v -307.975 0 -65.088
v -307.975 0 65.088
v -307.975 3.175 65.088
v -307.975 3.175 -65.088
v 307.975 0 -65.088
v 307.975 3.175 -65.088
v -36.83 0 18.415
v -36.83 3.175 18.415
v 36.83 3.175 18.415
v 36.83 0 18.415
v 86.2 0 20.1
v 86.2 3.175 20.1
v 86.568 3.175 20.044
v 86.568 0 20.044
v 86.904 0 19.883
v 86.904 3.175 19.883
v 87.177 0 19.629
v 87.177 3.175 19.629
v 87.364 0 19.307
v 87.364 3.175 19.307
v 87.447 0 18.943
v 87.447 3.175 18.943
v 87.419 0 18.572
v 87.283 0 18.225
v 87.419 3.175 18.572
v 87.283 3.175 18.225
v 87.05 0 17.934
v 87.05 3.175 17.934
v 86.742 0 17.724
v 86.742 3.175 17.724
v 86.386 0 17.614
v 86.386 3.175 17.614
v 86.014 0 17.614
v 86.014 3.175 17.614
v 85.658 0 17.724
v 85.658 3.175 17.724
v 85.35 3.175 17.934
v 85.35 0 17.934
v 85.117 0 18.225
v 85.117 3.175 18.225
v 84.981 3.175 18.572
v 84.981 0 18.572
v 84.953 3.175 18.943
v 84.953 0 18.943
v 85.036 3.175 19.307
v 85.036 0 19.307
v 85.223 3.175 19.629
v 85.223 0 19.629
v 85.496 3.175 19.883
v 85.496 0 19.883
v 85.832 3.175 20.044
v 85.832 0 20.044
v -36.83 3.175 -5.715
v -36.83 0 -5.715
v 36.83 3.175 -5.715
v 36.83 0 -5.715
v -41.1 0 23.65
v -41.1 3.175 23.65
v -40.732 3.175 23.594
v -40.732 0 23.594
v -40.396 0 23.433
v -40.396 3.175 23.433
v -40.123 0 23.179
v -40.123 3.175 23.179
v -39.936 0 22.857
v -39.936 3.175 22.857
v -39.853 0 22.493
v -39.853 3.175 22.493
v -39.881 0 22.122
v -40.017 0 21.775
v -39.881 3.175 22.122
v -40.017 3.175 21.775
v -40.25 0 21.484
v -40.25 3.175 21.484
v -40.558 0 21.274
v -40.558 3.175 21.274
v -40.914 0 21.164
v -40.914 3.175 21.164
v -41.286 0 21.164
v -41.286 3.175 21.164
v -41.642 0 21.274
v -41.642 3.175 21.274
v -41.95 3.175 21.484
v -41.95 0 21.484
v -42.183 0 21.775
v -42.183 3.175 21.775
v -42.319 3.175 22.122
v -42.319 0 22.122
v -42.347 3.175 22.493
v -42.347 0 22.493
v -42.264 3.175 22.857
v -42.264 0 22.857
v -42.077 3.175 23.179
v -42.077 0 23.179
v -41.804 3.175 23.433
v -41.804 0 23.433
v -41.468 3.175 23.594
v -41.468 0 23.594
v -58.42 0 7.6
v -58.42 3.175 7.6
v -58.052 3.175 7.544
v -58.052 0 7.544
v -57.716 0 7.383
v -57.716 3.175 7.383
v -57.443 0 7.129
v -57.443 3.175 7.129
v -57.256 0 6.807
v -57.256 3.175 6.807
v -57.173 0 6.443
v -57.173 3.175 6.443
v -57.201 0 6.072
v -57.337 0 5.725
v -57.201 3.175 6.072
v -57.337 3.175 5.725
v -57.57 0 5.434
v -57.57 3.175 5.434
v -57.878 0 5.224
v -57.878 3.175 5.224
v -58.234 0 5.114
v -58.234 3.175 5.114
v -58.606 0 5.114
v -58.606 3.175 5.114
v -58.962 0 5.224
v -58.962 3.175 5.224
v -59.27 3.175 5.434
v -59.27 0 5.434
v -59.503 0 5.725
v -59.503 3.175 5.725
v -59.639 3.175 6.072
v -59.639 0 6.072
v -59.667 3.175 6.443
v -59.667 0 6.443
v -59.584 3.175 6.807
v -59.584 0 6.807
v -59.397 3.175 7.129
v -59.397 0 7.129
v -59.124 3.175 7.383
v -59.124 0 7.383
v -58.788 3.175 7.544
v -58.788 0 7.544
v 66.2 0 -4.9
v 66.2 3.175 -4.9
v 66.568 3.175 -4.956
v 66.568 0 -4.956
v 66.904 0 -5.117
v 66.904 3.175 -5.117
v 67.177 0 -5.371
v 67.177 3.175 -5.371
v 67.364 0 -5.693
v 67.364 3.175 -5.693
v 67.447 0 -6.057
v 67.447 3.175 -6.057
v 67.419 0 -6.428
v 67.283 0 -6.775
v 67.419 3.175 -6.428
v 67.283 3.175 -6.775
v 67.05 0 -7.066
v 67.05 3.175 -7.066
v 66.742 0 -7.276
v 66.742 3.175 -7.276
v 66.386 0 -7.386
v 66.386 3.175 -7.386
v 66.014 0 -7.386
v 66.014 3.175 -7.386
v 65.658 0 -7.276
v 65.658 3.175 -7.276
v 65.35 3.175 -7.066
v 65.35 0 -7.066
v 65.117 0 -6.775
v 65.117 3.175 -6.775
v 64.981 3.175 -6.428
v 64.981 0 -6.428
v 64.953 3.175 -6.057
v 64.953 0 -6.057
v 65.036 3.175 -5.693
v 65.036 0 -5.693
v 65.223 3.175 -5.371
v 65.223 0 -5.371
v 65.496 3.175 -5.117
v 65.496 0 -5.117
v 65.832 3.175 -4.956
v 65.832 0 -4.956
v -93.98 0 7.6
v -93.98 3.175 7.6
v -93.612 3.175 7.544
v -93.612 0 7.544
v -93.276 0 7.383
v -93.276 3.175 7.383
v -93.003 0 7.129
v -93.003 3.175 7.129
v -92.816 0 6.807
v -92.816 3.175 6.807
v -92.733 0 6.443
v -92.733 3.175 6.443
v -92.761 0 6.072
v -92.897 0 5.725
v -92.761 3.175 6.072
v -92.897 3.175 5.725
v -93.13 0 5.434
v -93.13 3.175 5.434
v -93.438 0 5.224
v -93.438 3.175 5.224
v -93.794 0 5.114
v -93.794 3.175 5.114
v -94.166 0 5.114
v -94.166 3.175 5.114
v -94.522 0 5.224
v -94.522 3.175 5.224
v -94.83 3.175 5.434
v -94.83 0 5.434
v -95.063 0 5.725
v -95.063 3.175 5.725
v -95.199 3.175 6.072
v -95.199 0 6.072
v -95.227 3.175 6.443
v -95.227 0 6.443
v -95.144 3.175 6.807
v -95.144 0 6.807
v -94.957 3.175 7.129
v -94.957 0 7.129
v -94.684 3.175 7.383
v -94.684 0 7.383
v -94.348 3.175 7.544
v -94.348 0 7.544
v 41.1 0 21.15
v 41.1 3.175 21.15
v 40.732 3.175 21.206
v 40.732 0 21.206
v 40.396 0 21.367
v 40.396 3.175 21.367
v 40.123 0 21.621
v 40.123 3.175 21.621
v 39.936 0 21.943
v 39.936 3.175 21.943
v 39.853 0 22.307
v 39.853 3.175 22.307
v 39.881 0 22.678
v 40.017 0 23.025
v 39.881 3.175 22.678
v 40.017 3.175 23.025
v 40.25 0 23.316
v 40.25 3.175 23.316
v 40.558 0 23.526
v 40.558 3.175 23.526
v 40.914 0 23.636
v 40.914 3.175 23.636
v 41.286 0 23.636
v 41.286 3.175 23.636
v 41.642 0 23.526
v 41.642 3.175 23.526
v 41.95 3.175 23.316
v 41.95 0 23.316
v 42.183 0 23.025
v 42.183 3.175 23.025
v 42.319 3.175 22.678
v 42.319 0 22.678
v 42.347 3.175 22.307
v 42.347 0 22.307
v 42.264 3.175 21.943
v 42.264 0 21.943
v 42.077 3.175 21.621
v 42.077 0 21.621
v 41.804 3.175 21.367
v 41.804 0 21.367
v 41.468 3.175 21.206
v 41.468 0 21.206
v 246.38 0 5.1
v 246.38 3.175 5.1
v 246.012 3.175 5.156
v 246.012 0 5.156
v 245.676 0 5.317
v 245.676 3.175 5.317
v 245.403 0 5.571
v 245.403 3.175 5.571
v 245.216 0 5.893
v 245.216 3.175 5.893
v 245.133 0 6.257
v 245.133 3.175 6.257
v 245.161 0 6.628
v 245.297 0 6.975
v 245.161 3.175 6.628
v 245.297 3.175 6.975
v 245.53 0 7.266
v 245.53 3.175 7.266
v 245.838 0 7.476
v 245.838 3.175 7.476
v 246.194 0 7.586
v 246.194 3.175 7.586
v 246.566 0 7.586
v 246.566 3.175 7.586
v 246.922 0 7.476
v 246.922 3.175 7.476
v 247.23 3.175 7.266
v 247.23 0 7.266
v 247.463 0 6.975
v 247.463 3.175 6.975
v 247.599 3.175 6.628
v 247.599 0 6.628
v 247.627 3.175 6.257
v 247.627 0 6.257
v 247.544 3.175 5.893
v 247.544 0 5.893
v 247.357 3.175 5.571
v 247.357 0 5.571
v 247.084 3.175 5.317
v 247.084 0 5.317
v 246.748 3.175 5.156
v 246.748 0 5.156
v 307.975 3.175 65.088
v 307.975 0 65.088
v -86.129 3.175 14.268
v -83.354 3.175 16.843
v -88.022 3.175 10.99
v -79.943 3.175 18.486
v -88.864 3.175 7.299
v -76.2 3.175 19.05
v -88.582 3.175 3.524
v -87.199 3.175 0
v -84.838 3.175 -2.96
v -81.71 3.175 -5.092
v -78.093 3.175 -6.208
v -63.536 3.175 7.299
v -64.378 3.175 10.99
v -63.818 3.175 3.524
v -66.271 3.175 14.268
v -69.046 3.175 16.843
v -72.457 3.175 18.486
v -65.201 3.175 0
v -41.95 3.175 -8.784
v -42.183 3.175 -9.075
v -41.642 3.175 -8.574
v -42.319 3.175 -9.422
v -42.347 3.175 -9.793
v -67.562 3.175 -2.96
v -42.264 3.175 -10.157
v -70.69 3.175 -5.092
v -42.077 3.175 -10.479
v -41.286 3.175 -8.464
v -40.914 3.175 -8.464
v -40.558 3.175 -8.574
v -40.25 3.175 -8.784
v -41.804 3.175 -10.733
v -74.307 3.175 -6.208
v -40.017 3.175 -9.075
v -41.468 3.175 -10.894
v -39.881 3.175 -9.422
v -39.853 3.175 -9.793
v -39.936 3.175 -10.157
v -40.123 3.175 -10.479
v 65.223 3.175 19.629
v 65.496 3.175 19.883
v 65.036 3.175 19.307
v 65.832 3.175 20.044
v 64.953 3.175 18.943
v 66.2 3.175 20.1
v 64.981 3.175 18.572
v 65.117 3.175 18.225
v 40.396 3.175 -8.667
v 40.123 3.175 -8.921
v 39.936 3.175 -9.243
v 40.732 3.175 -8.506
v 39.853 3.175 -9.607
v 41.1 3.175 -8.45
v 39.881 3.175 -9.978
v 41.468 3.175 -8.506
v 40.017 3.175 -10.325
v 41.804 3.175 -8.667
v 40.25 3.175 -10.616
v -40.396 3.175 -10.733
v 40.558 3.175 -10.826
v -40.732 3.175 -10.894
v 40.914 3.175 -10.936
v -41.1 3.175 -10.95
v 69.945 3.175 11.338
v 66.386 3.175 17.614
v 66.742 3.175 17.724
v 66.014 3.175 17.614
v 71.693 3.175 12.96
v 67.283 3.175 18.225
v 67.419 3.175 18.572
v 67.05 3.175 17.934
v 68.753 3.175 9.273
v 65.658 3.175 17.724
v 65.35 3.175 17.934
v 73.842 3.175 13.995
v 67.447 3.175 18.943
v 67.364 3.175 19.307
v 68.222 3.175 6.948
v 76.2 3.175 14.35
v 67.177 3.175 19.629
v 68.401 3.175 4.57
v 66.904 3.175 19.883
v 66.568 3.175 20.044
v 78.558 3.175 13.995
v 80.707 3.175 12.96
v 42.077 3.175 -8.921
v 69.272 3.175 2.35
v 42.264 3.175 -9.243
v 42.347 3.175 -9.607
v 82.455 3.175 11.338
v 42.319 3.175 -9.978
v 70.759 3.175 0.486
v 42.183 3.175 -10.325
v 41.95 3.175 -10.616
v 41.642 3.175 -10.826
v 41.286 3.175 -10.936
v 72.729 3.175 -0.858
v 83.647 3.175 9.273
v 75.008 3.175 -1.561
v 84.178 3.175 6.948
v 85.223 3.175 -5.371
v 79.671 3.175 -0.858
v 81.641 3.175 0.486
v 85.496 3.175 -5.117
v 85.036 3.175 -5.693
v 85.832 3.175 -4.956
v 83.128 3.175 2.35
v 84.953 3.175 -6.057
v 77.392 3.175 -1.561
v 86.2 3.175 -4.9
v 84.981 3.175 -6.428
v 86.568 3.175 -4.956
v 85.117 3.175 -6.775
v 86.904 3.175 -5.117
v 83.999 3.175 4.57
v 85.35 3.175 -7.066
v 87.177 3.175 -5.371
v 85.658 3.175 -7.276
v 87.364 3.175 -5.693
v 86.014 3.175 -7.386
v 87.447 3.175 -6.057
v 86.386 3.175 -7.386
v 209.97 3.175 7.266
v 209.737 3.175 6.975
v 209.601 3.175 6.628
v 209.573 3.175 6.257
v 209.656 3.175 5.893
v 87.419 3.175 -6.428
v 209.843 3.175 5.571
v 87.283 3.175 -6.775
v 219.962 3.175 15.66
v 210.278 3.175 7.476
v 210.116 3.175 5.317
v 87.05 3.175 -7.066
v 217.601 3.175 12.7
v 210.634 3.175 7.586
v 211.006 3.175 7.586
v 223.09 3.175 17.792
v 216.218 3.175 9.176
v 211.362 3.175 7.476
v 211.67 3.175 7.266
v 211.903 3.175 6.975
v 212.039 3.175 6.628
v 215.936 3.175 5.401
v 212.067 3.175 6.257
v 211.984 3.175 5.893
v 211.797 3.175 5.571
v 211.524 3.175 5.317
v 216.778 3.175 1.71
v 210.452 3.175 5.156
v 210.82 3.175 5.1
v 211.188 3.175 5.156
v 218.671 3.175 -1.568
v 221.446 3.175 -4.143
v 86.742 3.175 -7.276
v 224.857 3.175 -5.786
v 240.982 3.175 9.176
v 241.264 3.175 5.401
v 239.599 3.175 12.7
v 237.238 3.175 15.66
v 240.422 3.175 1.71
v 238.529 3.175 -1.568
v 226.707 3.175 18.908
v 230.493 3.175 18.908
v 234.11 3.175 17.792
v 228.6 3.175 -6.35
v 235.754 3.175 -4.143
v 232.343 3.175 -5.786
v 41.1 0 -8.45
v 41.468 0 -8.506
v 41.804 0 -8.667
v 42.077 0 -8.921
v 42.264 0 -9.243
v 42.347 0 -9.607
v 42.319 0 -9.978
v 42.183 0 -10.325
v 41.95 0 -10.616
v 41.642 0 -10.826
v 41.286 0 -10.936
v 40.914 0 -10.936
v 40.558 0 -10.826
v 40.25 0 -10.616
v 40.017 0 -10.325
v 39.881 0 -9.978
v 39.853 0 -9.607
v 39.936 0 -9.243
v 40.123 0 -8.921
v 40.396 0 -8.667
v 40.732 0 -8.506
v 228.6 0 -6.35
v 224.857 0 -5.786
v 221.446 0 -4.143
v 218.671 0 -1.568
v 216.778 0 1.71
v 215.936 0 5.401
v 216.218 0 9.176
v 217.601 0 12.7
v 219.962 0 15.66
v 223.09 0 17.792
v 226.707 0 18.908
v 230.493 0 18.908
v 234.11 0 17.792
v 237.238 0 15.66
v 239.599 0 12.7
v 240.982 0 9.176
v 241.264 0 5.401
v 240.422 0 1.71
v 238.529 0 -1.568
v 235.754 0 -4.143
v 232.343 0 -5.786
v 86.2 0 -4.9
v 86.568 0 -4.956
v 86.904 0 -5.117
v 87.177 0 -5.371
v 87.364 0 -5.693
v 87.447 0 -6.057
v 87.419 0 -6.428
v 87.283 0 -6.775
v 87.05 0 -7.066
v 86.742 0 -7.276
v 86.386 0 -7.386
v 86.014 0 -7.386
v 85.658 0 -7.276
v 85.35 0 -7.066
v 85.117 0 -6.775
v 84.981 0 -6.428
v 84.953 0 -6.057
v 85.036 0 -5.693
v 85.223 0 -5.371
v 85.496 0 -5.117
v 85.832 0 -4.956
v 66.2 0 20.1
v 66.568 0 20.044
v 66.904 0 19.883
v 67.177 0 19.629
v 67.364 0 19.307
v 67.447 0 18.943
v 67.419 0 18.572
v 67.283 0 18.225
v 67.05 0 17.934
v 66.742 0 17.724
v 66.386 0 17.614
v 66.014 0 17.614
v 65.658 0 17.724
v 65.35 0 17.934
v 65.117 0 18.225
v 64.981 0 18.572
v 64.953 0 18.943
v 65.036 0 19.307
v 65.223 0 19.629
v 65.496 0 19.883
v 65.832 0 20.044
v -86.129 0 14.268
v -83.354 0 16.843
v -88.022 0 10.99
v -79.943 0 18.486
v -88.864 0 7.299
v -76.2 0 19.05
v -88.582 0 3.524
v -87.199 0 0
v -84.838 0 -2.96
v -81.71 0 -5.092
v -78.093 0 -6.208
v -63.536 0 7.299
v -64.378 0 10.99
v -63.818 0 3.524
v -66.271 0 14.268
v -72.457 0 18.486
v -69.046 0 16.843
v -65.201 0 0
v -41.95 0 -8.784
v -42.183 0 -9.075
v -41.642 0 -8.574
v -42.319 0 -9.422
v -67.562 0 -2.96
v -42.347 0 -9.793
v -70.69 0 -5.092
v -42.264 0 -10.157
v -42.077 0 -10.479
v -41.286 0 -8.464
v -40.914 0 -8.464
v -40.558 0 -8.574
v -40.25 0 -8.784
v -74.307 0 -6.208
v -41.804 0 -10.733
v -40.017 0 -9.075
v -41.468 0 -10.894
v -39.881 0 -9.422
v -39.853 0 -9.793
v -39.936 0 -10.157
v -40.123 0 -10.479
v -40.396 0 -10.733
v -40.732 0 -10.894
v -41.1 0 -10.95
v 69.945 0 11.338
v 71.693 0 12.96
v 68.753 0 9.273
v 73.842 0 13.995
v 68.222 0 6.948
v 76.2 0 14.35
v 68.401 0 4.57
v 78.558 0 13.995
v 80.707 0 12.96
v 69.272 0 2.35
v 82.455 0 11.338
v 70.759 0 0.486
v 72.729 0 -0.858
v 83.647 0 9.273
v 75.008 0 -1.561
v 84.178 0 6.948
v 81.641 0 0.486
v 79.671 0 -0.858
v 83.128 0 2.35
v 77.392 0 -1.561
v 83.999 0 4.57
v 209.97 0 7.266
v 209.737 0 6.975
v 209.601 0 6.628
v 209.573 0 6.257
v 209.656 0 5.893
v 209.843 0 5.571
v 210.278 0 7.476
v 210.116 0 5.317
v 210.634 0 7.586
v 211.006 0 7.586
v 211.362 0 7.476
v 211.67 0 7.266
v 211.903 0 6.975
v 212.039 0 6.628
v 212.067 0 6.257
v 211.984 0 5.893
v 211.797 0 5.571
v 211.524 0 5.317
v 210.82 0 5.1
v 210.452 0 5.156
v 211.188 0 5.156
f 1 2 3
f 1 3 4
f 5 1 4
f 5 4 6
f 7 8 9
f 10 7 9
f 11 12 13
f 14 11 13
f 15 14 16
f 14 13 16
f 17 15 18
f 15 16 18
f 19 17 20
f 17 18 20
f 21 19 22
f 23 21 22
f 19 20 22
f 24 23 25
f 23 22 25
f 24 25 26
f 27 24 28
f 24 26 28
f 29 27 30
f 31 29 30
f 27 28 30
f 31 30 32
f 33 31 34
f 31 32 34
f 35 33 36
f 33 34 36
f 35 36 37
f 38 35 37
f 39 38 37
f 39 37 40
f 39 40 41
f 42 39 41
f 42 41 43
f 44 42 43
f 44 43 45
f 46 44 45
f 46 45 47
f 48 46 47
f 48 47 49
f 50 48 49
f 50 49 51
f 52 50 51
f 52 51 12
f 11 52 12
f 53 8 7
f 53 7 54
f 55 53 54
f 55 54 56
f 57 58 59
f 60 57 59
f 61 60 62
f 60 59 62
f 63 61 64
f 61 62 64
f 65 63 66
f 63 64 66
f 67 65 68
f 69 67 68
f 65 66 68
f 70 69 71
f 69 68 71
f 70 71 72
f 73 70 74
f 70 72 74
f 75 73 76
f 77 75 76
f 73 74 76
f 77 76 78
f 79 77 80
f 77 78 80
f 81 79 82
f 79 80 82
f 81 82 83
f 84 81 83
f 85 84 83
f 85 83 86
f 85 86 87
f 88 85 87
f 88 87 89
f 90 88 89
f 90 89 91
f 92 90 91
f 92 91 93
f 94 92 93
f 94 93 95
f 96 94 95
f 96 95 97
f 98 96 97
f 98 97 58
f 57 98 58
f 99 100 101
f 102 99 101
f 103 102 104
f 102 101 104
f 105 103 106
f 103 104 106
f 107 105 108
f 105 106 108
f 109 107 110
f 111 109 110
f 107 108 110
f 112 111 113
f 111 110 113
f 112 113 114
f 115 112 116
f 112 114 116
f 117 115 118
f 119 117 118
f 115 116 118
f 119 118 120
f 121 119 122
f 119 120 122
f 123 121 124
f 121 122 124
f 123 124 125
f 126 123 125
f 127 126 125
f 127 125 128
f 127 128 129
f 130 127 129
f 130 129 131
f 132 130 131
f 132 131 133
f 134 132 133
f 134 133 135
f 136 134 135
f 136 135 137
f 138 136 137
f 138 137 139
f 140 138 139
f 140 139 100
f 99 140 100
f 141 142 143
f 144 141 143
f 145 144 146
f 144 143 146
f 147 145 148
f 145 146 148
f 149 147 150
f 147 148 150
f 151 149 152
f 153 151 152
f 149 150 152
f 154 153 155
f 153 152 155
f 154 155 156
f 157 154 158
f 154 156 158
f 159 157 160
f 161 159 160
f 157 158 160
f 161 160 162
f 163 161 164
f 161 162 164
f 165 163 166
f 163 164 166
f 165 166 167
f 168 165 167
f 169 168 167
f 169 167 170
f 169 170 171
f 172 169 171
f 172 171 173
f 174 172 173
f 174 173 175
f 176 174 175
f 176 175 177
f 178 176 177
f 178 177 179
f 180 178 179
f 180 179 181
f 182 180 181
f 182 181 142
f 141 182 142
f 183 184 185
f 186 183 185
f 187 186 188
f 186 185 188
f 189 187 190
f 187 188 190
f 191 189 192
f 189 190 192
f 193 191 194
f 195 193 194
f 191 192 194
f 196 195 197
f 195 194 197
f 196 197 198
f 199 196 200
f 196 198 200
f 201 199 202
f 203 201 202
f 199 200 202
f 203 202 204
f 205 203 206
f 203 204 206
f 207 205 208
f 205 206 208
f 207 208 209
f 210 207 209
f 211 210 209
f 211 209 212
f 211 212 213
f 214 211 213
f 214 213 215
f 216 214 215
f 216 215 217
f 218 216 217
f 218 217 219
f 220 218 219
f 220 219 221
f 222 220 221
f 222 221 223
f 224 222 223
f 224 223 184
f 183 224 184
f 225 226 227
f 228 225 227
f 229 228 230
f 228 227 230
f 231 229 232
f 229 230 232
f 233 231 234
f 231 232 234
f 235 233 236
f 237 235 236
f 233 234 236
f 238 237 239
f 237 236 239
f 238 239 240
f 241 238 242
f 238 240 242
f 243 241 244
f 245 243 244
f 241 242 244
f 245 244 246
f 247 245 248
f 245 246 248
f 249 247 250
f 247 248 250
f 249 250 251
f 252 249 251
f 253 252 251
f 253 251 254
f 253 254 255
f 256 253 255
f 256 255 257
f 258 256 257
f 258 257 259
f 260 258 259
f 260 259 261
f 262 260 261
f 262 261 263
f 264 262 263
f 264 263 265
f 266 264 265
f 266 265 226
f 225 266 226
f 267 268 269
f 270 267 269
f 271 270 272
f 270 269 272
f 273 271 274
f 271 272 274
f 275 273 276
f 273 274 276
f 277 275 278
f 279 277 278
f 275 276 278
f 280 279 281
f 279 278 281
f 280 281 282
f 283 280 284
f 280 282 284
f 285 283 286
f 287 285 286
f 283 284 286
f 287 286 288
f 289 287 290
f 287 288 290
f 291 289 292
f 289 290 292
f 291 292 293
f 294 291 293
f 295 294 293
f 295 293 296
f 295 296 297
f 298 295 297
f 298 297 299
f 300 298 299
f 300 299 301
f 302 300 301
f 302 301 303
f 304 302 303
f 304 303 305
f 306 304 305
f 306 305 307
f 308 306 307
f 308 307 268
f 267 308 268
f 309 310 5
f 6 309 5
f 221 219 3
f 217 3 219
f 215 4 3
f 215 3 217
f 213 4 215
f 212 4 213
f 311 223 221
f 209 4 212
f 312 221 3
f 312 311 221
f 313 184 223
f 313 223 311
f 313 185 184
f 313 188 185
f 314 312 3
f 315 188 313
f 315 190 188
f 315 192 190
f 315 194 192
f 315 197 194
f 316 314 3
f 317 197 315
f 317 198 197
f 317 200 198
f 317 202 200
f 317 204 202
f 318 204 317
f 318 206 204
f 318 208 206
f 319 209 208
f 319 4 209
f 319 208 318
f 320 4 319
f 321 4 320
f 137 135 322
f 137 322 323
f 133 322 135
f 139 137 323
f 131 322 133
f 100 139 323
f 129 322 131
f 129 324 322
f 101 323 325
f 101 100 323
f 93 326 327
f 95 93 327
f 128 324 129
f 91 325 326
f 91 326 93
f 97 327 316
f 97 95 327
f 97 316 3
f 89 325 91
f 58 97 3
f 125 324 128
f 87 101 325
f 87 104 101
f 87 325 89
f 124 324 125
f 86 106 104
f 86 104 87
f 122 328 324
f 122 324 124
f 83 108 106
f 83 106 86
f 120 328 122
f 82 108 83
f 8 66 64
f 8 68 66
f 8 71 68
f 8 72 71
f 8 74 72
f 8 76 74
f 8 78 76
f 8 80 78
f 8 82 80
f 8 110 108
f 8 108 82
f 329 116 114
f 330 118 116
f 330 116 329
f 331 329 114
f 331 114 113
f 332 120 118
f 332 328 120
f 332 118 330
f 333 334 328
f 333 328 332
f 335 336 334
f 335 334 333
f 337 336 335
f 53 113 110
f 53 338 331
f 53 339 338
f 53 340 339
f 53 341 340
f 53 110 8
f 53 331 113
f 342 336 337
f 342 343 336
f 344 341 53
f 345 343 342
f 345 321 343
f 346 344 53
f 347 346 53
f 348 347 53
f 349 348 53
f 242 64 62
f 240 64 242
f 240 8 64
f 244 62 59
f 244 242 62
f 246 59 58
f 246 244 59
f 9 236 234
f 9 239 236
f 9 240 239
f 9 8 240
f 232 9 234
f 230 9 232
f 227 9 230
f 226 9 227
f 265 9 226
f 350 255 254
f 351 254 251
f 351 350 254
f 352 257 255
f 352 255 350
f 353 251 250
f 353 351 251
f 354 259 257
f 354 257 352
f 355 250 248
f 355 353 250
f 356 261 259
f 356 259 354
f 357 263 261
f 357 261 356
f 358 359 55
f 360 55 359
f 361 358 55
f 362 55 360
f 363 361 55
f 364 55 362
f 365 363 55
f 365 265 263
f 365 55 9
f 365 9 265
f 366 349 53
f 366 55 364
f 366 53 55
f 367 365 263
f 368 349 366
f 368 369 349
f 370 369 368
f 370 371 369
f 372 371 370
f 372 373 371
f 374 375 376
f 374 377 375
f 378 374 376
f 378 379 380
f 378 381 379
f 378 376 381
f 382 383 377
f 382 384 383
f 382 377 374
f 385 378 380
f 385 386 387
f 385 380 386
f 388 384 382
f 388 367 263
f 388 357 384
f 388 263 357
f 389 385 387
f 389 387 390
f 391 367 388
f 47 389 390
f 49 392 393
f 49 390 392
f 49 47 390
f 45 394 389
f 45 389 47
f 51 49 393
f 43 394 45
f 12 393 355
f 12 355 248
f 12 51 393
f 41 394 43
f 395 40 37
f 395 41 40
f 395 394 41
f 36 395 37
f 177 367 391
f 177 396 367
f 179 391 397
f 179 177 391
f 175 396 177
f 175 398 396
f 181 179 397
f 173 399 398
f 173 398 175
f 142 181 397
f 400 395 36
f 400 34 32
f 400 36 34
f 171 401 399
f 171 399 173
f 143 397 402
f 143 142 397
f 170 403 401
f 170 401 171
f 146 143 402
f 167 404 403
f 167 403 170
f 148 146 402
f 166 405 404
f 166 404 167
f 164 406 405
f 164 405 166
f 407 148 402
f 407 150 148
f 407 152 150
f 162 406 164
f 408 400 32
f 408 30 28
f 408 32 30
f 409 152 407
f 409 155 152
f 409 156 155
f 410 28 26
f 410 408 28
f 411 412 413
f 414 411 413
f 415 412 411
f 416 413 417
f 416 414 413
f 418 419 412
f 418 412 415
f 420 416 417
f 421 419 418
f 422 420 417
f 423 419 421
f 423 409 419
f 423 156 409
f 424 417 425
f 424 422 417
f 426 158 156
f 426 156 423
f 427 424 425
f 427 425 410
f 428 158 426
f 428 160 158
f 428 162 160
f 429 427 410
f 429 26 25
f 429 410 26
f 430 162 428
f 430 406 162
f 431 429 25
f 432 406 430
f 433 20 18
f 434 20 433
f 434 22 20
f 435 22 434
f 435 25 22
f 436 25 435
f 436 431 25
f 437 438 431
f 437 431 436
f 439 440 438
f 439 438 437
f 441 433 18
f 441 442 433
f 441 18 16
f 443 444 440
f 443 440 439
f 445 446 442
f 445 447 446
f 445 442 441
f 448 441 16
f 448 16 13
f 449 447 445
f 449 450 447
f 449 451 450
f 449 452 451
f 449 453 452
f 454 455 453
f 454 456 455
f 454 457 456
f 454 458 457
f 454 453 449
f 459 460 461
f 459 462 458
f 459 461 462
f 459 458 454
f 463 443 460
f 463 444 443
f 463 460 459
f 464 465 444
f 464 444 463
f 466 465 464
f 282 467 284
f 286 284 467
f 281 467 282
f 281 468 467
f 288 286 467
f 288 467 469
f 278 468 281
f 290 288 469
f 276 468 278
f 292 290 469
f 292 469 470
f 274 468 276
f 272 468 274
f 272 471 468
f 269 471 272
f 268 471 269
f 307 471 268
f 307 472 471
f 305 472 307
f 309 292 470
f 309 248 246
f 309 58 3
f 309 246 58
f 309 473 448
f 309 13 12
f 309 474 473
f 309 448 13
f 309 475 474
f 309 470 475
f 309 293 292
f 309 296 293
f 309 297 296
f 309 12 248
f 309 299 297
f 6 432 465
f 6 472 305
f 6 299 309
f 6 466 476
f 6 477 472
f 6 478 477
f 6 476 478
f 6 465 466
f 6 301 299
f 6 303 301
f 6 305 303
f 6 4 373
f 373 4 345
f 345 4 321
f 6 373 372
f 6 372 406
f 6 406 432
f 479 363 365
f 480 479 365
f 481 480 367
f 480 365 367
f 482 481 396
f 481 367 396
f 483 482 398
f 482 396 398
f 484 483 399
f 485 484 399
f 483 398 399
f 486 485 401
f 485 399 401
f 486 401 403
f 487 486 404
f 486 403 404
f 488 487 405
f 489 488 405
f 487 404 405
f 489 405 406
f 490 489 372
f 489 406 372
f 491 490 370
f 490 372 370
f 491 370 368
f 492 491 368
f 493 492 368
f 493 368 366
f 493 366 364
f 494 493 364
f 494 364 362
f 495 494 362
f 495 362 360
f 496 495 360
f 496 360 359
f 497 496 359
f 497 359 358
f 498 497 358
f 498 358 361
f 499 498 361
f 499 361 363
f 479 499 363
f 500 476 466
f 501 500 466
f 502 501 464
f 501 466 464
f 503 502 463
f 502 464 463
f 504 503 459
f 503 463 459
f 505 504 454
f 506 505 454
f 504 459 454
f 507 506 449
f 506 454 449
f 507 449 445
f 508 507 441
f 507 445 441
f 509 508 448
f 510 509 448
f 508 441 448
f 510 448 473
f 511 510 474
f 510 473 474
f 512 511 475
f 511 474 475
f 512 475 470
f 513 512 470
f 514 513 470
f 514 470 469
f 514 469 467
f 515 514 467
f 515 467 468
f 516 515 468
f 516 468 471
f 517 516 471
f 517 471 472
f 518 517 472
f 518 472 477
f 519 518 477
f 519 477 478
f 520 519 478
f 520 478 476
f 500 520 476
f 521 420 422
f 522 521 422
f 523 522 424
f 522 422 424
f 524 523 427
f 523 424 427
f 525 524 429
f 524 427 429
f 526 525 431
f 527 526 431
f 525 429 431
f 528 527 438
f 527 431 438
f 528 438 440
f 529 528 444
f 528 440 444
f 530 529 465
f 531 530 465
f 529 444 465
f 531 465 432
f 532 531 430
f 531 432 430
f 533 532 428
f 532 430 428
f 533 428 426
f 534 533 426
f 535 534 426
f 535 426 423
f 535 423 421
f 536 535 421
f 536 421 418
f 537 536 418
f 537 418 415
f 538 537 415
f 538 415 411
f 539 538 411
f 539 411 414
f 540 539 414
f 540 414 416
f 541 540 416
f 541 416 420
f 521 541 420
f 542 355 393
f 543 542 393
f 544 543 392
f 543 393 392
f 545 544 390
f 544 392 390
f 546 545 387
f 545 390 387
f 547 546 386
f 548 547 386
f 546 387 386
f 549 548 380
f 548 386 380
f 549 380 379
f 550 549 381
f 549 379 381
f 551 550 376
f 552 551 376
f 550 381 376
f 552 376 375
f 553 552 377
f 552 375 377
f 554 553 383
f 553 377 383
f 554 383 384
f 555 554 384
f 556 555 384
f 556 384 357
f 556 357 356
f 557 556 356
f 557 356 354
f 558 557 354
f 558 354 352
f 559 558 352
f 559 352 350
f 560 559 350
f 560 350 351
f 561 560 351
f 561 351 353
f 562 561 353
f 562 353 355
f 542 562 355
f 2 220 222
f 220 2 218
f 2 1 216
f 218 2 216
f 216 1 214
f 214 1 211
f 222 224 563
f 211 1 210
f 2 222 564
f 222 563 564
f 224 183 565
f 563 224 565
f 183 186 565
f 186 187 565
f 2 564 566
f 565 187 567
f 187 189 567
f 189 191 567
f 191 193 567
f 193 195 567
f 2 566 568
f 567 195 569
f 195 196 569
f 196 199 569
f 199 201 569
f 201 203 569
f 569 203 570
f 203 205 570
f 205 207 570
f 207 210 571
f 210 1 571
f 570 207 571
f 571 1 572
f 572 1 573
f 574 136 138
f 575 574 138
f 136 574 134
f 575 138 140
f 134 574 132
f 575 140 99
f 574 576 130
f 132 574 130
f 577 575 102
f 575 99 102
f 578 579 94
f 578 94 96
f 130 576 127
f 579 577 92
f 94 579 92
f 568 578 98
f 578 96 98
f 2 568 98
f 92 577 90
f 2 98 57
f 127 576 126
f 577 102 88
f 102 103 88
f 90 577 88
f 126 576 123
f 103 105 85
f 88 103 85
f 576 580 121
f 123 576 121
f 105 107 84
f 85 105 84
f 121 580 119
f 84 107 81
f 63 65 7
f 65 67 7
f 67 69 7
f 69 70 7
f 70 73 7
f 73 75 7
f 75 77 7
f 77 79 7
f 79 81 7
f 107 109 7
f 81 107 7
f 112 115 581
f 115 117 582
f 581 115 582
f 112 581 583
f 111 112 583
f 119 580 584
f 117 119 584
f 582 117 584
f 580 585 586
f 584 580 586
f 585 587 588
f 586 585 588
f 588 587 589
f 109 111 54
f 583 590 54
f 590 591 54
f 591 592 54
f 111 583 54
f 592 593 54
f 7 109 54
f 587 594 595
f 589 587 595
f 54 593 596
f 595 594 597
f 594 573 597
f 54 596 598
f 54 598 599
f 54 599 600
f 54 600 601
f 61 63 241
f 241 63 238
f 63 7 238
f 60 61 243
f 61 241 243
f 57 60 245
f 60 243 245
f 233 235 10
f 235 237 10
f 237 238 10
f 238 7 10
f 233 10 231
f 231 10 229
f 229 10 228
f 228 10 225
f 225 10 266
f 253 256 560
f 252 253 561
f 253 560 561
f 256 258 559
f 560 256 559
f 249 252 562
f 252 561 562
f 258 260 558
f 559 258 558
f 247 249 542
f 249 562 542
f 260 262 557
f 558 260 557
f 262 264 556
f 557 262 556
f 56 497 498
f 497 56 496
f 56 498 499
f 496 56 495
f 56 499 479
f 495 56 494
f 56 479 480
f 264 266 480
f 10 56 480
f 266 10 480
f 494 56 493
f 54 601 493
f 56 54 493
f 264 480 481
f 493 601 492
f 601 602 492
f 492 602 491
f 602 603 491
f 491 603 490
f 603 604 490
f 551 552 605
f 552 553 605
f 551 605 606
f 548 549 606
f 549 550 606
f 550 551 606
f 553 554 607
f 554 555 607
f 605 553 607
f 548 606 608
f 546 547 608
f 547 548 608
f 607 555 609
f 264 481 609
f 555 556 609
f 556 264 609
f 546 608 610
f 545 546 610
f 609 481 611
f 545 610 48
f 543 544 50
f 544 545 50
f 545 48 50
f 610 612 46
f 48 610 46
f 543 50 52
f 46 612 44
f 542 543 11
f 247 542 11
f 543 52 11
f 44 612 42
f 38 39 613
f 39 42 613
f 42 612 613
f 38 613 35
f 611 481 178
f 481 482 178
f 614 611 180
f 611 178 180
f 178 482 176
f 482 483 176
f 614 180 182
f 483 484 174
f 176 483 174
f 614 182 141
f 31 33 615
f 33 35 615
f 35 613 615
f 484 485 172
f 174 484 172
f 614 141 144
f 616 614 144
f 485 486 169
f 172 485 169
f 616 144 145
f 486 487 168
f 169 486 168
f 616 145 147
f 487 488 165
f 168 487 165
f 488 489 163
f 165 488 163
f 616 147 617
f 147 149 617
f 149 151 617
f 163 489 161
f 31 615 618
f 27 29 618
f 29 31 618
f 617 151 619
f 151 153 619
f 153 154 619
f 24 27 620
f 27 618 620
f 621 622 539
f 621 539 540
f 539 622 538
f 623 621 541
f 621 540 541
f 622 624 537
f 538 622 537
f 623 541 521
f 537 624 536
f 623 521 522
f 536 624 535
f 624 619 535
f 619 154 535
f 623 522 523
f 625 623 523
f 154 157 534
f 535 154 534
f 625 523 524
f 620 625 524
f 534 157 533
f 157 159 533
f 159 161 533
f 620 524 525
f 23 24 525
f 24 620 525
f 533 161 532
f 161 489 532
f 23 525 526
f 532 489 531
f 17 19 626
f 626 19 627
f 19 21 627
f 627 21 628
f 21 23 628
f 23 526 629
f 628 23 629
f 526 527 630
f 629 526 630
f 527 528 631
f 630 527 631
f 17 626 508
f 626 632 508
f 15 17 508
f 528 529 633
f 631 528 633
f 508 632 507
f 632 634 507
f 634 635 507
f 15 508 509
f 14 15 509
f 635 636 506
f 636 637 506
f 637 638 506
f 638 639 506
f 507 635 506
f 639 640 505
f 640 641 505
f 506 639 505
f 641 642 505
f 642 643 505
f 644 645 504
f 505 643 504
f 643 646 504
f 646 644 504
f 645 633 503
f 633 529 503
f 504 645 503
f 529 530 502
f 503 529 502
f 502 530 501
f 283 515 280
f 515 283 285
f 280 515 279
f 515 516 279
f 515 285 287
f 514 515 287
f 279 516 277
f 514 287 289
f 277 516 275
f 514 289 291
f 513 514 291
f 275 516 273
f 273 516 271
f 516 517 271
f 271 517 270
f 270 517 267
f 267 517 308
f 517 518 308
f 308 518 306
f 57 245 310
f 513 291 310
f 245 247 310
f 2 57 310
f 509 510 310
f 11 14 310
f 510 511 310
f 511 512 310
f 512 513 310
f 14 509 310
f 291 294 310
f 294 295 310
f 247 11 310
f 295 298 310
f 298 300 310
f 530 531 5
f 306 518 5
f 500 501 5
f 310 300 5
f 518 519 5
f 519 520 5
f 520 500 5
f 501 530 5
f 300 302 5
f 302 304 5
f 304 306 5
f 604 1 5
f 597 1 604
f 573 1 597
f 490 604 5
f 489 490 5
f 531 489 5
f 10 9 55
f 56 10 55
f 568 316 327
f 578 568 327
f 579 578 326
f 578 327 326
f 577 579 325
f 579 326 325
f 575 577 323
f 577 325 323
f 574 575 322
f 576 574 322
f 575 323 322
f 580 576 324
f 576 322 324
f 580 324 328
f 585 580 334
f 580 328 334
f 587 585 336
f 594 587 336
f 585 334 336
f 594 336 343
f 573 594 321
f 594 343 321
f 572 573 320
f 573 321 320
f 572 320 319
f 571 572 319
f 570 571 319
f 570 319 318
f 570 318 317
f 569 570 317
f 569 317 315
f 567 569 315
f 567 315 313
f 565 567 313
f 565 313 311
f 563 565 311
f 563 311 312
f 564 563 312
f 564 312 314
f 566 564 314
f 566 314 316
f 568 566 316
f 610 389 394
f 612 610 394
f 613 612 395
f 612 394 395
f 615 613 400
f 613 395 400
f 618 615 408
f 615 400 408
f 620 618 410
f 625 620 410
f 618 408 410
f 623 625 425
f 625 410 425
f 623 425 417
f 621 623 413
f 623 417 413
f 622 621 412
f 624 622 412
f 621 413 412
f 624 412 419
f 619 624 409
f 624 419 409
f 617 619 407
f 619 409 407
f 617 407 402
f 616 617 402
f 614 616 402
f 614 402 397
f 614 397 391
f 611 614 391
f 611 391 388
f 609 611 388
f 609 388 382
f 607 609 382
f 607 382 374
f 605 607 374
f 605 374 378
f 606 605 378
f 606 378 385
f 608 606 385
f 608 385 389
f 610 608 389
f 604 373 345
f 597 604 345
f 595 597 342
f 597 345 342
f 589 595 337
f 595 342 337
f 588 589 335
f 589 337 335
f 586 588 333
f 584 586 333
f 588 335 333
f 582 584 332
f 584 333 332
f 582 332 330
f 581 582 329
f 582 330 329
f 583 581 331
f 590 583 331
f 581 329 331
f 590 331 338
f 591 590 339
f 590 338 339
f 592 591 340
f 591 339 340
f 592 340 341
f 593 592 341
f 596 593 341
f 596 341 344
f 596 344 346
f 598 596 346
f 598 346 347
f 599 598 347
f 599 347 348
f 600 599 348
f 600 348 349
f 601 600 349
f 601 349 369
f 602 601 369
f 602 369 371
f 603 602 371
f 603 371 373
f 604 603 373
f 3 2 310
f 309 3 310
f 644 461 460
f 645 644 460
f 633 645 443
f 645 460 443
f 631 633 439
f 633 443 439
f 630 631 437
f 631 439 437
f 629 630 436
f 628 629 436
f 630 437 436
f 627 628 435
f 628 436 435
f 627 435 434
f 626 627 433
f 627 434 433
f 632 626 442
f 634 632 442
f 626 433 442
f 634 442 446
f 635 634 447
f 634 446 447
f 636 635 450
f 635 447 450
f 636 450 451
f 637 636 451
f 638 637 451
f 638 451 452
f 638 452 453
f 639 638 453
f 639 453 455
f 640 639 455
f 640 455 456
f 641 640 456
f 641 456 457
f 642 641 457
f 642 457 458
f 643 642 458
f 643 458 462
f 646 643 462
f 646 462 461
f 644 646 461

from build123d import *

# Parameters (mm, degrees)
SKETCH1_W           = 615.95
SKETCH1_H           = 130.175
BOSS_EXTRUDE1_DEPTH = 3.175
SKETCH2_R           = 1.25
SKETCH2_R_2         = 12.7
SKETCH2_R_3         = 8
SKETCH2_W           = 73.66
SKETCH2_H           = 24.13
CUT_EXTRUDE1_DEPTH  = 315.793684667


with BuildPart() as part:
    # Sketch1 → Boss-Extrude1 (new body)
    with BuildSketch(Plane(origin=(0, 0, 0), x_dir=(1, 0, 0), z_dir=(0, 1, 0))):
        Rectangle(SKETCH1_W, SKETCH1_H)
    extrude(amount=BOSS_EXTRUDE1_DEPTH)

    # Sketch2 → Cut-Extrude1 (cut, through all)
    with BuildSketch(Plane(origin=(0, 3.175, 0), x_dir=(1, 0, 0), z_dir=(0, 1, 0))):
        with Locations(Location((41.099999842, 9.699999904, 0), (0, 0, 270))):
            Circle(SKETCH2_R)
        with Locations(Location((41.099999842, -22.399999904, 0), (0, 0, 90))):
            Circle(SKETCH2_R)
        with Locations(Location((-41.099999842, -22.399999904, 0), (0, 0, 270))):
            Circle(SKETCH2_R)
        with Locations(Location((-41.099999842, 9.699999904, 0), (0, 0, 90))):
            Circle(SKETCH2_R)
        with Locations(Location((-76.2, -6.35, 0), (0, 0, 270))):
            Circle(SKETCH2_R_2)
        with Locations(Location((-93.98, -6.35, 0), (0, 0, 270))):
            Circle(SKETCH2_R)
        with Locations(Location((-58.42, -6.35, 0), (0, 0, 270))):
            Circle(SKETCH2_R)
        with Locations(Location((86.2, 6.15, 0), (0, 0, 270))):
            Circle(SKETCH2_R)
        with Locations(Location((86.2, -18.85, 0), (0, 0, 270))):
            Circle(SKETCH2_R)
        with Locations(Location((66.2, -18.85, 0), (0, 0, 270))):
            Circle(SKETCH2_R)
        with Locations(Location((66.2, 6.15, 0), (0, 0, 270))):
            Circle(SKETCH2_R)
        with Locations(Location((76.2, -6.35, 0), (0, 0, 270))):
            Circle(SKETCH2_R_3)
        with Locations(Location((246.38, -6.35, 0), (0, 0, 90))):
            Circle(SKETCH2_R)
        with Locations(Location((210.82, -6.35, 0), (0, 0, 90))):
            Circle(SKETCH2_R)
        with Locations(Location((228.6, -6.35, 0), (0, 0, 90))):
            Circle(SKETCH2_R_2)
        with Locations((0, -6.35)):
            Rectangle(SKETCH2_W, SKETCH2_H)
    extrude(amount=-CUT_EXTRUDE1_DEPTH, mode=Mode.SUBTRACT)


solid = part.part
